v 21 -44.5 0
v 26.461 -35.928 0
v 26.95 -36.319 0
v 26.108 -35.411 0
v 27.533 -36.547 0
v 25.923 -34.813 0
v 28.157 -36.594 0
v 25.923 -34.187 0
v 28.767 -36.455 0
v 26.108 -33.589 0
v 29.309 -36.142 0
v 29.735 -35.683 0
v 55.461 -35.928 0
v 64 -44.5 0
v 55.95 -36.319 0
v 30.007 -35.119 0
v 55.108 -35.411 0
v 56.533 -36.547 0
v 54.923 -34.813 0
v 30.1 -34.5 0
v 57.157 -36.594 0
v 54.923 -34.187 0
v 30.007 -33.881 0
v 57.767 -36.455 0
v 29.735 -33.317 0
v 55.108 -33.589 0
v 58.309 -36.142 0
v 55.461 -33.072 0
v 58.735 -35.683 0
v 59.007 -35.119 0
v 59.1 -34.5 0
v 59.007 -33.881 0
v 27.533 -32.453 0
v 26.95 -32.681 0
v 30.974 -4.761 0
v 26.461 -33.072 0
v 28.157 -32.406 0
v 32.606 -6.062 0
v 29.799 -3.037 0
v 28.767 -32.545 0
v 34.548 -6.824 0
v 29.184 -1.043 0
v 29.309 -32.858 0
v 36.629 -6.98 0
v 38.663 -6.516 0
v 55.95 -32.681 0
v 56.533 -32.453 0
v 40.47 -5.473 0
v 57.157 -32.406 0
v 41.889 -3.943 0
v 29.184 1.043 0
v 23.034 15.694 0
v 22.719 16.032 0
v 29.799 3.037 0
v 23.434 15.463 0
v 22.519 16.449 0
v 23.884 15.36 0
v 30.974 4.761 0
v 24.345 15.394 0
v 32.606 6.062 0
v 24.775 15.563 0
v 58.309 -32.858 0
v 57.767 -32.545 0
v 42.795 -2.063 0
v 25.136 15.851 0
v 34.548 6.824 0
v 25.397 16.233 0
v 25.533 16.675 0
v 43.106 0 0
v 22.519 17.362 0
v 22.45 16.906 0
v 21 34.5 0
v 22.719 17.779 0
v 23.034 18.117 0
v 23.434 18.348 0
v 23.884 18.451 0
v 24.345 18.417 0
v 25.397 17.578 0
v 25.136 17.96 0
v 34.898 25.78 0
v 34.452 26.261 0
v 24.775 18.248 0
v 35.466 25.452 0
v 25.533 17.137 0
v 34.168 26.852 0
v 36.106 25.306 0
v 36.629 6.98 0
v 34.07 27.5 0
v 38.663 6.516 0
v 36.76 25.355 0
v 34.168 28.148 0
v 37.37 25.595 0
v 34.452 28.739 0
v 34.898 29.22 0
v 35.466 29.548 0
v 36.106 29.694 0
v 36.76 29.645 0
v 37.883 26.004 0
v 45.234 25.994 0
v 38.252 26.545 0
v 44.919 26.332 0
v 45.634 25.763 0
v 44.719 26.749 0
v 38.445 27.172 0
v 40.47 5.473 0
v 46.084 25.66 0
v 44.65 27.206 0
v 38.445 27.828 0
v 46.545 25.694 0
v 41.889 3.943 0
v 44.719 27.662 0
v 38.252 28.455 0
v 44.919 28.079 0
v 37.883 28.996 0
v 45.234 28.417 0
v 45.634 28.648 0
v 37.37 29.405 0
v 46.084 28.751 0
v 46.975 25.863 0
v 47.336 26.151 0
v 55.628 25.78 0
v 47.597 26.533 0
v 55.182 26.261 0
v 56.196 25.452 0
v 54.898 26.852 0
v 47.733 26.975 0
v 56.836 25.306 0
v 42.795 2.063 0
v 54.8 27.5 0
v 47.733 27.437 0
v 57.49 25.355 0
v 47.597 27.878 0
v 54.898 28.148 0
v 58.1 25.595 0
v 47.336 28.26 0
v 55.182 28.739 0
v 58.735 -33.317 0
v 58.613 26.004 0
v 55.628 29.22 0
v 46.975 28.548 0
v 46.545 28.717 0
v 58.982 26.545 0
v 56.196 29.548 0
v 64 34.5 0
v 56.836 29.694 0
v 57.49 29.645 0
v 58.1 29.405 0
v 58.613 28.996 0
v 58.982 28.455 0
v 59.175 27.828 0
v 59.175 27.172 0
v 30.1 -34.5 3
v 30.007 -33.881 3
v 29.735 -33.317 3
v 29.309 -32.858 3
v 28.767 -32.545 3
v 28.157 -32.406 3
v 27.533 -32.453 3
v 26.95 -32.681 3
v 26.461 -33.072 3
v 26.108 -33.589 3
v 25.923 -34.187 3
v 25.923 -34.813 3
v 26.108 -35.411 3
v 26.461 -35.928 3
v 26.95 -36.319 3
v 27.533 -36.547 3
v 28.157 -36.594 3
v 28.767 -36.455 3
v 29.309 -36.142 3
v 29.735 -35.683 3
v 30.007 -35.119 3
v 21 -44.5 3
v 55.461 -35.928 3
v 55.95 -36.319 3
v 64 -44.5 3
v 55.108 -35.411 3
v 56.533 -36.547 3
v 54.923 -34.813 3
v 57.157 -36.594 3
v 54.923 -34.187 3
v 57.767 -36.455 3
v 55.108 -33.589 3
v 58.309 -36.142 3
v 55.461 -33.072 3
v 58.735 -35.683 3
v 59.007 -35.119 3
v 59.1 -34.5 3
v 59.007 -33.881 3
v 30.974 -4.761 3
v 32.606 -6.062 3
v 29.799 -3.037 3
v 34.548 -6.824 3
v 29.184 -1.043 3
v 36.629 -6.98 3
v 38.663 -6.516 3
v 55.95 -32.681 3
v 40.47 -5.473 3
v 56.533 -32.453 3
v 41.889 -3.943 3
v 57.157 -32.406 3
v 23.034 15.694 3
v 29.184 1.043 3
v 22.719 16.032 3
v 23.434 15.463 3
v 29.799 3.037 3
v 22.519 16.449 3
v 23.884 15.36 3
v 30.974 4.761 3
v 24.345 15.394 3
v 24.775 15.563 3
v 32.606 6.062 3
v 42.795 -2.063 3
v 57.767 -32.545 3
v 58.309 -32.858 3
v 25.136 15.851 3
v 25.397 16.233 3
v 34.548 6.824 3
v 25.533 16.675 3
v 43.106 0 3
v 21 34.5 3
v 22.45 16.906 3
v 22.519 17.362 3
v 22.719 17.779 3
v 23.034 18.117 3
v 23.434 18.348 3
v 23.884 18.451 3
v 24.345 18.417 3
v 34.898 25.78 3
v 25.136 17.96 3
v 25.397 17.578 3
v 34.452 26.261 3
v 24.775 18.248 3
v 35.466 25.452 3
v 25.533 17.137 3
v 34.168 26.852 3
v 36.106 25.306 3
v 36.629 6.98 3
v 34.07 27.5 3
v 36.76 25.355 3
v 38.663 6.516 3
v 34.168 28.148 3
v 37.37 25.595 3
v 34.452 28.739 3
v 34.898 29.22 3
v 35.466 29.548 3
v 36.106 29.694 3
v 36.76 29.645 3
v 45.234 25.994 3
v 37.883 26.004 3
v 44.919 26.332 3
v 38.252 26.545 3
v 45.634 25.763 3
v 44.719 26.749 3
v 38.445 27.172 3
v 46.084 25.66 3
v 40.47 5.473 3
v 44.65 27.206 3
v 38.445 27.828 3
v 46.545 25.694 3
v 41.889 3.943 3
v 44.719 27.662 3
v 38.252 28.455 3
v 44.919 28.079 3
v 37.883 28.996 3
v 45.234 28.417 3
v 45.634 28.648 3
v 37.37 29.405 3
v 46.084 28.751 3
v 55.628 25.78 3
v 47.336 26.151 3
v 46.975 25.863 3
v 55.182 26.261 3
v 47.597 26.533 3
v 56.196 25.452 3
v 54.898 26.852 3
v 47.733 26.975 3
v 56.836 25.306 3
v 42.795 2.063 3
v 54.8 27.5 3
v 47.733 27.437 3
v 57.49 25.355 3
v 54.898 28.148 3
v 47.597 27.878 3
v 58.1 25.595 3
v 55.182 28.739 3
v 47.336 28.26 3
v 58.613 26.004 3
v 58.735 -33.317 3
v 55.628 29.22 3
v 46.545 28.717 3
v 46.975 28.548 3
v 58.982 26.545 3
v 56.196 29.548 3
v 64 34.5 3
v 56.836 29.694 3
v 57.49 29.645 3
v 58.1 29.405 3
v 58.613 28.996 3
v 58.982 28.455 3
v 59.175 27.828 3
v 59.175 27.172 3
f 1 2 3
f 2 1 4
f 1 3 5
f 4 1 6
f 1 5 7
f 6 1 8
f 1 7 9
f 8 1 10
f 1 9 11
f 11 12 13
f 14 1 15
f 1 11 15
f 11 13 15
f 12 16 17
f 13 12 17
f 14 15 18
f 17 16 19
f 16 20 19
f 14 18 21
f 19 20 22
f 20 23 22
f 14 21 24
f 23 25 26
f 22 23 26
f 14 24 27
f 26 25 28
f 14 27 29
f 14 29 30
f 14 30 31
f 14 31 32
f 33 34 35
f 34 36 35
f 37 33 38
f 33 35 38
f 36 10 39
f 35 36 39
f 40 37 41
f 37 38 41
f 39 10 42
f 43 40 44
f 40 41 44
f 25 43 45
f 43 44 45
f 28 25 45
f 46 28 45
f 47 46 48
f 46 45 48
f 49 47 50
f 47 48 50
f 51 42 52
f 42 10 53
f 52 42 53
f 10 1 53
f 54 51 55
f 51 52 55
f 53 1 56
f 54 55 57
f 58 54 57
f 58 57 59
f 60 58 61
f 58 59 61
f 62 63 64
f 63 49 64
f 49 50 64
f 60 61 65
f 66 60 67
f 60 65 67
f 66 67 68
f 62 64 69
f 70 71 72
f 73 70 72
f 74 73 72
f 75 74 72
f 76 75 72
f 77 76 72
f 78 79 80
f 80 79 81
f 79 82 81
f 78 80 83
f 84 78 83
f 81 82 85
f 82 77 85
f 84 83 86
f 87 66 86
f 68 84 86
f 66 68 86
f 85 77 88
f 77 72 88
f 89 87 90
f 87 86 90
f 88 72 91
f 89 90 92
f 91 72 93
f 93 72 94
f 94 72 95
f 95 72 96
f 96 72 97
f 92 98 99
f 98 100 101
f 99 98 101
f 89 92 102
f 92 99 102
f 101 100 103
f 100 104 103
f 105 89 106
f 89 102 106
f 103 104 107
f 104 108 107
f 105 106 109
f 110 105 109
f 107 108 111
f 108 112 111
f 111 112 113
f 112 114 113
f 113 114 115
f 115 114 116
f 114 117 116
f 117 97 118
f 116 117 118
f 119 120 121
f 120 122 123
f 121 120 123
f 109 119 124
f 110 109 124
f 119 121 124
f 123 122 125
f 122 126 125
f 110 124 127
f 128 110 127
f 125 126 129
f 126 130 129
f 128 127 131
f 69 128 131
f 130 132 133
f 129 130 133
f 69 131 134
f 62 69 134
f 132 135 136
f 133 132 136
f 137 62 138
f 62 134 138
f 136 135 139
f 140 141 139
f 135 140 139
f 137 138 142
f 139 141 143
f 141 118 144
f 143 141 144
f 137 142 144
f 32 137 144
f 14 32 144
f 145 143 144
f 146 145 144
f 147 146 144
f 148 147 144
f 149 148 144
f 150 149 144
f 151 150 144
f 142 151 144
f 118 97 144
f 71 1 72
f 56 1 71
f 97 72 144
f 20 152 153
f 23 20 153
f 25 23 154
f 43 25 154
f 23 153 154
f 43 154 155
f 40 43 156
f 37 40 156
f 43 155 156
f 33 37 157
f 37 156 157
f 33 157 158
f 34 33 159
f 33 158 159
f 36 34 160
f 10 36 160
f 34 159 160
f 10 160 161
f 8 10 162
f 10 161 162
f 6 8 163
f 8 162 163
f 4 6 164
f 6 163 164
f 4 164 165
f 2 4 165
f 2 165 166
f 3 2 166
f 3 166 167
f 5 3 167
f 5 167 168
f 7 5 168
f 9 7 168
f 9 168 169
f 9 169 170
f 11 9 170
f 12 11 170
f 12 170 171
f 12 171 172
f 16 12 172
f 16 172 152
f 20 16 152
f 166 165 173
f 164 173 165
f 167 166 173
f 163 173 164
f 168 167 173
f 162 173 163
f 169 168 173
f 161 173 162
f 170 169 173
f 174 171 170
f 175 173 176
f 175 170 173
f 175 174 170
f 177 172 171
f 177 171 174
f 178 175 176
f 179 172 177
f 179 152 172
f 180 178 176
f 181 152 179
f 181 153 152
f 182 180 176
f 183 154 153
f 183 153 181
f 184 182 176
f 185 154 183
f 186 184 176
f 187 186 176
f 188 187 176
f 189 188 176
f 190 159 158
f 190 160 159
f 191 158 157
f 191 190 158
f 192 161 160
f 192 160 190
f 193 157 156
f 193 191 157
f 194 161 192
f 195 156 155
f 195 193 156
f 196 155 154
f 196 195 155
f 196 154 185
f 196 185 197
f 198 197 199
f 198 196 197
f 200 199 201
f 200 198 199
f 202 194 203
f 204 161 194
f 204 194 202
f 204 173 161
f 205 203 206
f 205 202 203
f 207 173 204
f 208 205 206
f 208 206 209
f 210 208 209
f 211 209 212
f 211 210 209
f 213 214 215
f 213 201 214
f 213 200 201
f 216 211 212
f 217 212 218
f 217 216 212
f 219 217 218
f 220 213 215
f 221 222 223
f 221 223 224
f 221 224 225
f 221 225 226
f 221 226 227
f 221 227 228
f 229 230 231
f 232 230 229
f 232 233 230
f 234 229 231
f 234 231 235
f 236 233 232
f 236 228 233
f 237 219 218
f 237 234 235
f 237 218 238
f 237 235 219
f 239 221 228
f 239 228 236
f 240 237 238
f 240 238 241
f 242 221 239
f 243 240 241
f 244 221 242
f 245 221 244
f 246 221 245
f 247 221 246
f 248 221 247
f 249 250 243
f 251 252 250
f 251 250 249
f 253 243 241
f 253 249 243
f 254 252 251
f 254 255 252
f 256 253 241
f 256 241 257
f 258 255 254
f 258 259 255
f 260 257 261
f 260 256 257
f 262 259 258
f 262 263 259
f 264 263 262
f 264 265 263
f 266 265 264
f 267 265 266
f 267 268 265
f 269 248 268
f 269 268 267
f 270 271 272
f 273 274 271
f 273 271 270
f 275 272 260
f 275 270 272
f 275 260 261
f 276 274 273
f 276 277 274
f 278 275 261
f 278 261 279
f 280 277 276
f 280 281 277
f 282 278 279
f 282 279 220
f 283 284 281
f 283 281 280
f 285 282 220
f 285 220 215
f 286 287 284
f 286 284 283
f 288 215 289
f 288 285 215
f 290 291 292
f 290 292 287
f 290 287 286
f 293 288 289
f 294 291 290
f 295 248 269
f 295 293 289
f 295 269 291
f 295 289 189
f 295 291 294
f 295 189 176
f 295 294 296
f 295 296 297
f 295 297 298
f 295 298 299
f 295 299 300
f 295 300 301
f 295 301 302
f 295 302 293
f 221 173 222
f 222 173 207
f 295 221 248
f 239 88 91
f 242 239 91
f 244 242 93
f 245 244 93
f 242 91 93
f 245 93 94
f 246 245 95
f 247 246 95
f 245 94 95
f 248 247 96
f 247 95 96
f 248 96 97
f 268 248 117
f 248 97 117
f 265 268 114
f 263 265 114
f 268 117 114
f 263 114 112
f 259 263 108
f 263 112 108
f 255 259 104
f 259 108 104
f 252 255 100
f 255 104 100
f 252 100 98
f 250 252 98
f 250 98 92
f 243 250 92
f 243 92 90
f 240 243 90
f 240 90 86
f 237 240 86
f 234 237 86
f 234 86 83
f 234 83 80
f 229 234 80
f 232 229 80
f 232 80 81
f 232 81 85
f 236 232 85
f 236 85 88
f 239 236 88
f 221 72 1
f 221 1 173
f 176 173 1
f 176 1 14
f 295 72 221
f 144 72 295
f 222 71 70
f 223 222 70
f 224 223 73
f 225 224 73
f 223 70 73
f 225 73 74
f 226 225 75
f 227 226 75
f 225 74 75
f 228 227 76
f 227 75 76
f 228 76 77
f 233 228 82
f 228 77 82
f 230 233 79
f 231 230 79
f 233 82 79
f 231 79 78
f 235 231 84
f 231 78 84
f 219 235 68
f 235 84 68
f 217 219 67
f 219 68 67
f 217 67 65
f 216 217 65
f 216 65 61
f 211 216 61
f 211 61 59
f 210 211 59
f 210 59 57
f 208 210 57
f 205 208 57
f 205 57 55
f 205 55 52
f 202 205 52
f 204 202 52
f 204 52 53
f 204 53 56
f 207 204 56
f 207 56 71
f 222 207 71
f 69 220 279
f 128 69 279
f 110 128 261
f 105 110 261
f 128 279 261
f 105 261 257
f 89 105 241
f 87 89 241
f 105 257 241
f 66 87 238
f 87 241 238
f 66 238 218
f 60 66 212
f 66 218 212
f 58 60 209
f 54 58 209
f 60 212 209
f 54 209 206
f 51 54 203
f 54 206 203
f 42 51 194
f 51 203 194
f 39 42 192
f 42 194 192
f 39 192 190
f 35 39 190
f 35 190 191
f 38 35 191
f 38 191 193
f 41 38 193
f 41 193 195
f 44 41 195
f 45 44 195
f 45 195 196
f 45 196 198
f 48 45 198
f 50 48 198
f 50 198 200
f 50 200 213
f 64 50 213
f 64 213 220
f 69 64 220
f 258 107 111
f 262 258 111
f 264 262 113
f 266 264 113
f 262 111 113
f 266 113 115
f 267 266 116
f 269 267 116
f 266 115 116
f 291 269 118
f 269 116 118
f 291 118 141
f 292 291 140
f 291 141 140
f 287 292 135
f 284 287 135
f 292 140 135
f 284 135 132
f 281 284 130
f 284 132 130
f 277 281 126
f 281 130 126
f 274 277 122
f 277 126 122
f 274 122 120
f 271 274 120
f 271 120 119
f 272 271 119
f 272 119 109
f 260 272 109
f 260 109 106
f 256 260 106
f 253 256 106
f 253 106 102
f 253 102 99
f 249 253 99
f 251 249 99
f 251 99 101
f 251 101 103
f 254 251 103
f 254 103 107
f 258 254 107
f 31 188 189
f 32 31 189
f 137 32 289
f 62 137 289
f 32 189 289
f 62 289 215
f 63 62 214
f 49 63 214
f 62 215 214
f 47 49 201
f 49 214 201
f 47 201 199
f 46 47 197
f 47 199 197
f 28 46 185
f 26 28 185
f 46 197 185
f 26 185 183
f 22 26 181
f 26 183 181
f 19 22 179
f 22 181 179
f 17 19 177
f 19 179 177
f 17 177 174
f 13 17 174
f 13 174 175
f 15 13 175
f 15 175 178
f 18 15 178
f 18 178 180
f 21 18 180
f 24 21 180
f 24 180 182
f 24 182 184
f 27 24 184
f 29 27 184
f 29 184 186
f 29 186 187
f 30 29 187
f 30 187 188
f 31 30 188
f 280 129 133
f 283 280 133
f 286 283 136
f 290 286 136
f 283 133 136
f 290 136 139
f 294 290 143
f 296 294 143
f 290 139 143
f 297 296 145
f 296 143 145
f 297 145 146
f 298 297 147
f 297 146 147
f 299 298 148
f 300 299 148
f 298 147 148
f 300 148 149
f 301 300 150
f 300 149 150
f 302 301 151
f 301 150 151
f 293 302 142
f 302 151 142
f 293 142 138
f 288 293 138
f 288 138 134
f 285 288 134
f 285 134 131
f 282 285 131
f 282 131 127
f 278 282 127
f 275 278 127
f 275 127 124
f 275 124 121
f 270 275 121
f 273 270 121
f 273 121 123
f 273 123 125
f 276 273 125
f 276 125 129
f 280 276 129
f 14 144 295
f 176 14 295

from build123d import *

# Parameters (mm, degrees)
SKETCH_1_W                = 40
SKETCH_1_H                = 29
EXTRUDE_1_DEPTH           = 3
CUT_EXTRUDE_1_DEPTH       = 3
SKETCH_3_W                = 40
SKETCH_3_H                = 3
EXTRUDE_2_DEPTH           = 10
SKETCH_4_W                = 40
SKETCH_4_H                = 3
EXTRUDE_3_DEPTH           = 10
SKETCH_6_W                = 3
SKETCH_6_H                = 49
EXTRUDE_5_DEPTH           = 42
SKETCH_8_W                = 3
SKETCH_8_H                = 49
EXTRUDE_6_DEPTH           = 2
SKETCH_9_W                = 3
SKETCH_9_H                = 49
EXTRUDE_7_DEPTH           = 2
SKETCH_10_W               = 86
SKETCH_10_H               = 3
EXTRUDE_8_DEPTH           = 10
SKETCH_11_W               = 86
SKETCH_11_H               = 3
EXTRUDE_9_DEPTH           = 10
SKETCH_7_R                = 7
CUT_EXTRUDE_4_DEPTH       = 10
SKETCH_14_W               = 3
SKETCH_14_H               = 69
CUT_EXTRUDE_5_DEPTH       = 43
SKETCH_17_W               = 43
SKETCH_17_H               = 3
EXTRUDE_10_DEPTH          = 20
SKETCH_18_R               = 2.1
CUT_EXTRUDE_6_DEPTH       = 10
SKETCH_20_W               = 43
SKETCH_20_H               = 3
EXTRUDE_11_DEPTH          = 10
SKETCH_21_W               = 43
SKETCH_21_H               = 3
CUT_EXTRUDE_7_DEPTH       = 20
SKETCH_24_R               = 2.2
CUT_EXTRUDE_8_DEPTH       = 30
SKETCH_25_R               = 1.55
CUT_EXTRUDE_11_DEPTH      = 1
CUT_EXTRUDE_11_DEPTH_BACK = 4


with BuildPart() as part:
    # ｽｹｯﾁ1 → ﾎﾞｽ - 押し出し1 (new body)
    with BuildSketch(Plane.XY):
        Rectangle(SKETCH_1_W, SKETCH_1_H)
    extrude(amount=EXTRUDE_1_DEPTH)

    # ｽｹｯﾁ2 → ｶｯﾄ - 押し出し1 (cut)
    with BuildSketch(Plane.XY.offset(3)):
        with BuildLine():
            ThreePointArc((-14.4, 10.5), (-15.01507576, 11.98492424), (-16.5, 12.6))
            Line((-16.5, 12.6), (-16.5, 10.5))
            Line((-16.5, 10.5), (-18.6, 10.5))
            ThreePointArc((-18.6, 10.5), (-16.5, 8.4), (-14.4, 10.5))
        make_face()
        with BuildLine():
            Line((-16.5, 10.5), (-16.5, 12.6))
            ThreePointArc((-16.5, 12.6), (-17.98492424, 11.98492424), (-18.6, 10.5))
            Line((-18.6, 10.5), (-16.5, 10.5))
        make_face()
        with BuildLine():
            ThreePointArc((-18.6, -10.5), (-17.98492424, -11.98492424), (-16.5, -12.6))
            Line((-16.5, -12.6), (-16.5, -10.5))
            Line((-16.5, -10.5), (-18.6, -10.5))
        make_face()
        with BuildLine():
            Line((-16.5, -10.5), (-16.5, -12.6))
            ThreePointArc((-16.5, -12.6), (-15.01507576, -11.98492424), (-14.4, -10.5))
            ThreePointArc((-14.4, -10.5), (-16.5, -8.4), (-18.6, -10.5))
            Line((-18.6, -10.5), (-16.5, -10.5))
        make_face()
        with BuildLine():
            ThreePointArc((18.6, -10.5), (15.01507576, -9.01507576), (16.5, -12.6))
            Line((16.5, -12.6), (16.5, -10.5))
            Line((16.5, -10.5), (18.6, -10.5))
        make_face()
        with BuildLine():
            Line((16.5, -10.5), (16.5, -12.6))
            ThreePointArc((16.5, -12.6), (17.98492424, -11.98492424), (18.6, -10.5))
            Line((18.6, -10.5), (16.5, -10.5))
        make_face()
        with BuildLine():
            ThreePointArc((18.6, 10.5), (17.98492424, 11.98492424), (16.5, 12.6))
            Line((16.5, 12.6), (16.5, 10.5))
            Line((16.5, 10.5), (18.6, 10.5))
        make_face()
        with BuildLine():
            Line((16.5, 10.5), (16.5, 12.6))
            ThreePointArc((16.5, 12.6), (15.01507576, 9.01507576), (18.6, 10.5))
            Line((18.6, 10.5), (16.5, 10.5))
        make_face()
    extrude(amount=-CUT_EXTRUDE_1_DEPTH, mode=Mode.SUBTRACT)

    # ｽｹｯﾁ3 → ﾎﾞｽ - 押し出し2 (add)
    with BuildSketch(Plane.XZ.offset(14.5)):
        with Locations((0, 1.5)):
            Rectangle(SKETCH_3_W, SKETCH_3_H)
    extrude(amount=EXTRUDE_2_DEPTH)

    # ｽｹｯﾁ4 → ﾎﾞｽ - 押し出し3 (add)
    with BuildSketch(Plane(origin=(0, 14.5, 0), x_dir=(1, 0, 0), z_dir=(0, 1, 0))):
        with Locations((0, -1.5)):
            Rectangle(SKETCH_4_W, SKETCH_4_H)
    extrude(amount=EXTRUDE_3_DEPTH)

    # ｽｹｯﾁ6 → ﾎﾞｽ - 押し出し5 (add)
    with BuildSketch(Plane(origin=(20, 0, 0), x_dir=(0, 0, -1), z_dir=(1, 0, 0))):
        with Locations((-1.5, 0)):
            Rectangle(SKETCH_6_W, SKETCH_6_H)
    extrude(amount=EXTRUDE_5_DEPTH)

    # ｽｹｯﾁ8 → ﾎﾞｽ - 押し出し6 (add)
    with BuildSketch(Plane.ZY.offset(20)):
        with Locations((1.5, 0)):
            Rectangle(SKETCH_8_W, SKETCH_8_H)
    extrude(amount=EXTRUDE_6_DEPTH)

    # ｽｹｯﾁ9 → ﾎﾞｽ - 押し出し7 (add)
    with BuildSketch(Plane(origin=(62, 0, 0), x_dir=(0, 0, -1), z_dir=(1, 0, 0))):
        with Locations((-1.5, 0)):
            Rectangle(SKETCH_9_W, SKETCH_9_H)
    extrude(amount=EXTRUDE_7_DEPTH)

    # ｽｹｯﾁ10 → ﾎﾞｽ - 押し出し8 (add)
    with BuildSketch(Plane.XZ.offset(24.5)):
        with Locations((21, 1.5)):
            Rectangle(SKETCH_10_W, SKETCH_10_H)
    extrude(amount=EXTRUDE_8_DEPTH)

    # ｽｹｯﾁ11 → ﾎﾞｽ - 押し出し9 (add)
    with BuildSketch(Plane(origin=(0, 24.5, 0), x_dir=(1, 0, 0), z_dir=(0, 1, 0))):
        with Locations((21, -1.5)):
            Rectangle(SKETCH_11_W, SKETCH_11_H)
    extrude(amount=EXTRUDE_9_DEPTH)

    # ｽｹｯﾁ7 → ｶｯﾄ - 押し出し4 (cut)
    with BuildSketch(Plane.XY.offset(3)):
        with Locations((36.10579786, 0)):
            Circle(SKETCH_7_R)
    extrude(amount=-CUT_EXTRUDE_4_DEPTH, mode=Mode.SUBTRACT)

    # ｽｹｯﾁ14 → ｶｯﾄ - 押し出し5 (cut)
    with BuildSketch(Plane.ZY.offset(22)):
        with Locations((1.5, 0)):
            Rectangle(SKETCH_14_W, SKETCH_14_H)
    extrude(amount=-CUT_EXTRUDE_5_DEPTH, mode=Mode.SUBTRACT)

    # ｽｹｯﾁ17 → ﾎﾞｽ - 押し出し10 (add)
    with BuildSketch(Plane.XZ.offset(34.5)):
        with Locations((42.5, 1.5)):
            Rectangle(SKETCH_17_W, SKETCH_17_H)
    extrude(amount=EXTRUDE_10_DEPTH)

    # ｽｹｯﾁ18 → ｶｯﾄ - 押し出し6 (cut)
    with BuildSketch(Plane.XY.offset(3)):
        with Locations((28, -34.5)):
            Circle(SKETCH_18_R)
        with Locations((57, -34.5)):
            Circle(SKETCH_18_R)
    extrude(amount=-CUT_EXTRUDE_6_DEPTH, mode=Mode.SUBTRACT)

    # ｽｹｯﾁ20 → ﾎﾞｽ - 押し出し11 (add)
    with BuildSketch(Plane.XZ.offset(54.5)):
        with Locations((42.5, 1.5)):
            Rectangle(SKETCH_20_W, SKETCH_20_H)
    extrude(amount=EXTRUDE_11_DEPTH)

    # ｽｹｯﾁ21 → ｶｯﾄ - 押し出し7 (cut)
    with BuildSketch(Plane.XZ.offset(64.5)):
        with Locations((42.5, 1.5)):
            Rectangle(SKETCH_21_W, SKETCH_21_H)
    extrude(amount=-CUT_EXTRUDE_7_DEPTH, mode=Mode.SUBTRACT)

    # ｽｹｯﾁ24 → ｶｯﾄ - 押し出し8 (cut)
    with BuildSketch(Plane(origin=(0, 0, 0), x_dir=(-1, 0, 0), z_dir=(0, 0, -1))):
        with Locations((-36.27, 27.5)):
            Circle(SKETCH_24_R)
        with Locations((-57, 27.5)):
            Circle(SKETCH_24_R)
    extrude(amount=-CUT_EXTRUDE_8_DEPTH, mode=Mode.SUBTRACT)

    # ｽｹｯﾁ25 → ｶｯﾄ - 押し出し11 (cut, two sides)
    with BuildSketch(Plane(origin=(0, 0, 0), x_dir=(-1, 0, 0), z_dir=(0, 0, -1))) as cut_extrude_11_sk:
        with Locations((-24, 16.905537109)):
            Circle(SKETCH_25_R)
        with Locations((-46.2, 27.205537109)):
            Circle(SKETCH_25_R)
    extrude(amount=CUT_EXTRUDE_11_DEPTH, mode=Mode.SUBTRACT)
    extrude(cut_extrude_11_sk.sketch, amount=-CUT_EXTRUDE_11_DEPTH_BACK, mode=Mode.SUBTRACT)


solid = part.part
